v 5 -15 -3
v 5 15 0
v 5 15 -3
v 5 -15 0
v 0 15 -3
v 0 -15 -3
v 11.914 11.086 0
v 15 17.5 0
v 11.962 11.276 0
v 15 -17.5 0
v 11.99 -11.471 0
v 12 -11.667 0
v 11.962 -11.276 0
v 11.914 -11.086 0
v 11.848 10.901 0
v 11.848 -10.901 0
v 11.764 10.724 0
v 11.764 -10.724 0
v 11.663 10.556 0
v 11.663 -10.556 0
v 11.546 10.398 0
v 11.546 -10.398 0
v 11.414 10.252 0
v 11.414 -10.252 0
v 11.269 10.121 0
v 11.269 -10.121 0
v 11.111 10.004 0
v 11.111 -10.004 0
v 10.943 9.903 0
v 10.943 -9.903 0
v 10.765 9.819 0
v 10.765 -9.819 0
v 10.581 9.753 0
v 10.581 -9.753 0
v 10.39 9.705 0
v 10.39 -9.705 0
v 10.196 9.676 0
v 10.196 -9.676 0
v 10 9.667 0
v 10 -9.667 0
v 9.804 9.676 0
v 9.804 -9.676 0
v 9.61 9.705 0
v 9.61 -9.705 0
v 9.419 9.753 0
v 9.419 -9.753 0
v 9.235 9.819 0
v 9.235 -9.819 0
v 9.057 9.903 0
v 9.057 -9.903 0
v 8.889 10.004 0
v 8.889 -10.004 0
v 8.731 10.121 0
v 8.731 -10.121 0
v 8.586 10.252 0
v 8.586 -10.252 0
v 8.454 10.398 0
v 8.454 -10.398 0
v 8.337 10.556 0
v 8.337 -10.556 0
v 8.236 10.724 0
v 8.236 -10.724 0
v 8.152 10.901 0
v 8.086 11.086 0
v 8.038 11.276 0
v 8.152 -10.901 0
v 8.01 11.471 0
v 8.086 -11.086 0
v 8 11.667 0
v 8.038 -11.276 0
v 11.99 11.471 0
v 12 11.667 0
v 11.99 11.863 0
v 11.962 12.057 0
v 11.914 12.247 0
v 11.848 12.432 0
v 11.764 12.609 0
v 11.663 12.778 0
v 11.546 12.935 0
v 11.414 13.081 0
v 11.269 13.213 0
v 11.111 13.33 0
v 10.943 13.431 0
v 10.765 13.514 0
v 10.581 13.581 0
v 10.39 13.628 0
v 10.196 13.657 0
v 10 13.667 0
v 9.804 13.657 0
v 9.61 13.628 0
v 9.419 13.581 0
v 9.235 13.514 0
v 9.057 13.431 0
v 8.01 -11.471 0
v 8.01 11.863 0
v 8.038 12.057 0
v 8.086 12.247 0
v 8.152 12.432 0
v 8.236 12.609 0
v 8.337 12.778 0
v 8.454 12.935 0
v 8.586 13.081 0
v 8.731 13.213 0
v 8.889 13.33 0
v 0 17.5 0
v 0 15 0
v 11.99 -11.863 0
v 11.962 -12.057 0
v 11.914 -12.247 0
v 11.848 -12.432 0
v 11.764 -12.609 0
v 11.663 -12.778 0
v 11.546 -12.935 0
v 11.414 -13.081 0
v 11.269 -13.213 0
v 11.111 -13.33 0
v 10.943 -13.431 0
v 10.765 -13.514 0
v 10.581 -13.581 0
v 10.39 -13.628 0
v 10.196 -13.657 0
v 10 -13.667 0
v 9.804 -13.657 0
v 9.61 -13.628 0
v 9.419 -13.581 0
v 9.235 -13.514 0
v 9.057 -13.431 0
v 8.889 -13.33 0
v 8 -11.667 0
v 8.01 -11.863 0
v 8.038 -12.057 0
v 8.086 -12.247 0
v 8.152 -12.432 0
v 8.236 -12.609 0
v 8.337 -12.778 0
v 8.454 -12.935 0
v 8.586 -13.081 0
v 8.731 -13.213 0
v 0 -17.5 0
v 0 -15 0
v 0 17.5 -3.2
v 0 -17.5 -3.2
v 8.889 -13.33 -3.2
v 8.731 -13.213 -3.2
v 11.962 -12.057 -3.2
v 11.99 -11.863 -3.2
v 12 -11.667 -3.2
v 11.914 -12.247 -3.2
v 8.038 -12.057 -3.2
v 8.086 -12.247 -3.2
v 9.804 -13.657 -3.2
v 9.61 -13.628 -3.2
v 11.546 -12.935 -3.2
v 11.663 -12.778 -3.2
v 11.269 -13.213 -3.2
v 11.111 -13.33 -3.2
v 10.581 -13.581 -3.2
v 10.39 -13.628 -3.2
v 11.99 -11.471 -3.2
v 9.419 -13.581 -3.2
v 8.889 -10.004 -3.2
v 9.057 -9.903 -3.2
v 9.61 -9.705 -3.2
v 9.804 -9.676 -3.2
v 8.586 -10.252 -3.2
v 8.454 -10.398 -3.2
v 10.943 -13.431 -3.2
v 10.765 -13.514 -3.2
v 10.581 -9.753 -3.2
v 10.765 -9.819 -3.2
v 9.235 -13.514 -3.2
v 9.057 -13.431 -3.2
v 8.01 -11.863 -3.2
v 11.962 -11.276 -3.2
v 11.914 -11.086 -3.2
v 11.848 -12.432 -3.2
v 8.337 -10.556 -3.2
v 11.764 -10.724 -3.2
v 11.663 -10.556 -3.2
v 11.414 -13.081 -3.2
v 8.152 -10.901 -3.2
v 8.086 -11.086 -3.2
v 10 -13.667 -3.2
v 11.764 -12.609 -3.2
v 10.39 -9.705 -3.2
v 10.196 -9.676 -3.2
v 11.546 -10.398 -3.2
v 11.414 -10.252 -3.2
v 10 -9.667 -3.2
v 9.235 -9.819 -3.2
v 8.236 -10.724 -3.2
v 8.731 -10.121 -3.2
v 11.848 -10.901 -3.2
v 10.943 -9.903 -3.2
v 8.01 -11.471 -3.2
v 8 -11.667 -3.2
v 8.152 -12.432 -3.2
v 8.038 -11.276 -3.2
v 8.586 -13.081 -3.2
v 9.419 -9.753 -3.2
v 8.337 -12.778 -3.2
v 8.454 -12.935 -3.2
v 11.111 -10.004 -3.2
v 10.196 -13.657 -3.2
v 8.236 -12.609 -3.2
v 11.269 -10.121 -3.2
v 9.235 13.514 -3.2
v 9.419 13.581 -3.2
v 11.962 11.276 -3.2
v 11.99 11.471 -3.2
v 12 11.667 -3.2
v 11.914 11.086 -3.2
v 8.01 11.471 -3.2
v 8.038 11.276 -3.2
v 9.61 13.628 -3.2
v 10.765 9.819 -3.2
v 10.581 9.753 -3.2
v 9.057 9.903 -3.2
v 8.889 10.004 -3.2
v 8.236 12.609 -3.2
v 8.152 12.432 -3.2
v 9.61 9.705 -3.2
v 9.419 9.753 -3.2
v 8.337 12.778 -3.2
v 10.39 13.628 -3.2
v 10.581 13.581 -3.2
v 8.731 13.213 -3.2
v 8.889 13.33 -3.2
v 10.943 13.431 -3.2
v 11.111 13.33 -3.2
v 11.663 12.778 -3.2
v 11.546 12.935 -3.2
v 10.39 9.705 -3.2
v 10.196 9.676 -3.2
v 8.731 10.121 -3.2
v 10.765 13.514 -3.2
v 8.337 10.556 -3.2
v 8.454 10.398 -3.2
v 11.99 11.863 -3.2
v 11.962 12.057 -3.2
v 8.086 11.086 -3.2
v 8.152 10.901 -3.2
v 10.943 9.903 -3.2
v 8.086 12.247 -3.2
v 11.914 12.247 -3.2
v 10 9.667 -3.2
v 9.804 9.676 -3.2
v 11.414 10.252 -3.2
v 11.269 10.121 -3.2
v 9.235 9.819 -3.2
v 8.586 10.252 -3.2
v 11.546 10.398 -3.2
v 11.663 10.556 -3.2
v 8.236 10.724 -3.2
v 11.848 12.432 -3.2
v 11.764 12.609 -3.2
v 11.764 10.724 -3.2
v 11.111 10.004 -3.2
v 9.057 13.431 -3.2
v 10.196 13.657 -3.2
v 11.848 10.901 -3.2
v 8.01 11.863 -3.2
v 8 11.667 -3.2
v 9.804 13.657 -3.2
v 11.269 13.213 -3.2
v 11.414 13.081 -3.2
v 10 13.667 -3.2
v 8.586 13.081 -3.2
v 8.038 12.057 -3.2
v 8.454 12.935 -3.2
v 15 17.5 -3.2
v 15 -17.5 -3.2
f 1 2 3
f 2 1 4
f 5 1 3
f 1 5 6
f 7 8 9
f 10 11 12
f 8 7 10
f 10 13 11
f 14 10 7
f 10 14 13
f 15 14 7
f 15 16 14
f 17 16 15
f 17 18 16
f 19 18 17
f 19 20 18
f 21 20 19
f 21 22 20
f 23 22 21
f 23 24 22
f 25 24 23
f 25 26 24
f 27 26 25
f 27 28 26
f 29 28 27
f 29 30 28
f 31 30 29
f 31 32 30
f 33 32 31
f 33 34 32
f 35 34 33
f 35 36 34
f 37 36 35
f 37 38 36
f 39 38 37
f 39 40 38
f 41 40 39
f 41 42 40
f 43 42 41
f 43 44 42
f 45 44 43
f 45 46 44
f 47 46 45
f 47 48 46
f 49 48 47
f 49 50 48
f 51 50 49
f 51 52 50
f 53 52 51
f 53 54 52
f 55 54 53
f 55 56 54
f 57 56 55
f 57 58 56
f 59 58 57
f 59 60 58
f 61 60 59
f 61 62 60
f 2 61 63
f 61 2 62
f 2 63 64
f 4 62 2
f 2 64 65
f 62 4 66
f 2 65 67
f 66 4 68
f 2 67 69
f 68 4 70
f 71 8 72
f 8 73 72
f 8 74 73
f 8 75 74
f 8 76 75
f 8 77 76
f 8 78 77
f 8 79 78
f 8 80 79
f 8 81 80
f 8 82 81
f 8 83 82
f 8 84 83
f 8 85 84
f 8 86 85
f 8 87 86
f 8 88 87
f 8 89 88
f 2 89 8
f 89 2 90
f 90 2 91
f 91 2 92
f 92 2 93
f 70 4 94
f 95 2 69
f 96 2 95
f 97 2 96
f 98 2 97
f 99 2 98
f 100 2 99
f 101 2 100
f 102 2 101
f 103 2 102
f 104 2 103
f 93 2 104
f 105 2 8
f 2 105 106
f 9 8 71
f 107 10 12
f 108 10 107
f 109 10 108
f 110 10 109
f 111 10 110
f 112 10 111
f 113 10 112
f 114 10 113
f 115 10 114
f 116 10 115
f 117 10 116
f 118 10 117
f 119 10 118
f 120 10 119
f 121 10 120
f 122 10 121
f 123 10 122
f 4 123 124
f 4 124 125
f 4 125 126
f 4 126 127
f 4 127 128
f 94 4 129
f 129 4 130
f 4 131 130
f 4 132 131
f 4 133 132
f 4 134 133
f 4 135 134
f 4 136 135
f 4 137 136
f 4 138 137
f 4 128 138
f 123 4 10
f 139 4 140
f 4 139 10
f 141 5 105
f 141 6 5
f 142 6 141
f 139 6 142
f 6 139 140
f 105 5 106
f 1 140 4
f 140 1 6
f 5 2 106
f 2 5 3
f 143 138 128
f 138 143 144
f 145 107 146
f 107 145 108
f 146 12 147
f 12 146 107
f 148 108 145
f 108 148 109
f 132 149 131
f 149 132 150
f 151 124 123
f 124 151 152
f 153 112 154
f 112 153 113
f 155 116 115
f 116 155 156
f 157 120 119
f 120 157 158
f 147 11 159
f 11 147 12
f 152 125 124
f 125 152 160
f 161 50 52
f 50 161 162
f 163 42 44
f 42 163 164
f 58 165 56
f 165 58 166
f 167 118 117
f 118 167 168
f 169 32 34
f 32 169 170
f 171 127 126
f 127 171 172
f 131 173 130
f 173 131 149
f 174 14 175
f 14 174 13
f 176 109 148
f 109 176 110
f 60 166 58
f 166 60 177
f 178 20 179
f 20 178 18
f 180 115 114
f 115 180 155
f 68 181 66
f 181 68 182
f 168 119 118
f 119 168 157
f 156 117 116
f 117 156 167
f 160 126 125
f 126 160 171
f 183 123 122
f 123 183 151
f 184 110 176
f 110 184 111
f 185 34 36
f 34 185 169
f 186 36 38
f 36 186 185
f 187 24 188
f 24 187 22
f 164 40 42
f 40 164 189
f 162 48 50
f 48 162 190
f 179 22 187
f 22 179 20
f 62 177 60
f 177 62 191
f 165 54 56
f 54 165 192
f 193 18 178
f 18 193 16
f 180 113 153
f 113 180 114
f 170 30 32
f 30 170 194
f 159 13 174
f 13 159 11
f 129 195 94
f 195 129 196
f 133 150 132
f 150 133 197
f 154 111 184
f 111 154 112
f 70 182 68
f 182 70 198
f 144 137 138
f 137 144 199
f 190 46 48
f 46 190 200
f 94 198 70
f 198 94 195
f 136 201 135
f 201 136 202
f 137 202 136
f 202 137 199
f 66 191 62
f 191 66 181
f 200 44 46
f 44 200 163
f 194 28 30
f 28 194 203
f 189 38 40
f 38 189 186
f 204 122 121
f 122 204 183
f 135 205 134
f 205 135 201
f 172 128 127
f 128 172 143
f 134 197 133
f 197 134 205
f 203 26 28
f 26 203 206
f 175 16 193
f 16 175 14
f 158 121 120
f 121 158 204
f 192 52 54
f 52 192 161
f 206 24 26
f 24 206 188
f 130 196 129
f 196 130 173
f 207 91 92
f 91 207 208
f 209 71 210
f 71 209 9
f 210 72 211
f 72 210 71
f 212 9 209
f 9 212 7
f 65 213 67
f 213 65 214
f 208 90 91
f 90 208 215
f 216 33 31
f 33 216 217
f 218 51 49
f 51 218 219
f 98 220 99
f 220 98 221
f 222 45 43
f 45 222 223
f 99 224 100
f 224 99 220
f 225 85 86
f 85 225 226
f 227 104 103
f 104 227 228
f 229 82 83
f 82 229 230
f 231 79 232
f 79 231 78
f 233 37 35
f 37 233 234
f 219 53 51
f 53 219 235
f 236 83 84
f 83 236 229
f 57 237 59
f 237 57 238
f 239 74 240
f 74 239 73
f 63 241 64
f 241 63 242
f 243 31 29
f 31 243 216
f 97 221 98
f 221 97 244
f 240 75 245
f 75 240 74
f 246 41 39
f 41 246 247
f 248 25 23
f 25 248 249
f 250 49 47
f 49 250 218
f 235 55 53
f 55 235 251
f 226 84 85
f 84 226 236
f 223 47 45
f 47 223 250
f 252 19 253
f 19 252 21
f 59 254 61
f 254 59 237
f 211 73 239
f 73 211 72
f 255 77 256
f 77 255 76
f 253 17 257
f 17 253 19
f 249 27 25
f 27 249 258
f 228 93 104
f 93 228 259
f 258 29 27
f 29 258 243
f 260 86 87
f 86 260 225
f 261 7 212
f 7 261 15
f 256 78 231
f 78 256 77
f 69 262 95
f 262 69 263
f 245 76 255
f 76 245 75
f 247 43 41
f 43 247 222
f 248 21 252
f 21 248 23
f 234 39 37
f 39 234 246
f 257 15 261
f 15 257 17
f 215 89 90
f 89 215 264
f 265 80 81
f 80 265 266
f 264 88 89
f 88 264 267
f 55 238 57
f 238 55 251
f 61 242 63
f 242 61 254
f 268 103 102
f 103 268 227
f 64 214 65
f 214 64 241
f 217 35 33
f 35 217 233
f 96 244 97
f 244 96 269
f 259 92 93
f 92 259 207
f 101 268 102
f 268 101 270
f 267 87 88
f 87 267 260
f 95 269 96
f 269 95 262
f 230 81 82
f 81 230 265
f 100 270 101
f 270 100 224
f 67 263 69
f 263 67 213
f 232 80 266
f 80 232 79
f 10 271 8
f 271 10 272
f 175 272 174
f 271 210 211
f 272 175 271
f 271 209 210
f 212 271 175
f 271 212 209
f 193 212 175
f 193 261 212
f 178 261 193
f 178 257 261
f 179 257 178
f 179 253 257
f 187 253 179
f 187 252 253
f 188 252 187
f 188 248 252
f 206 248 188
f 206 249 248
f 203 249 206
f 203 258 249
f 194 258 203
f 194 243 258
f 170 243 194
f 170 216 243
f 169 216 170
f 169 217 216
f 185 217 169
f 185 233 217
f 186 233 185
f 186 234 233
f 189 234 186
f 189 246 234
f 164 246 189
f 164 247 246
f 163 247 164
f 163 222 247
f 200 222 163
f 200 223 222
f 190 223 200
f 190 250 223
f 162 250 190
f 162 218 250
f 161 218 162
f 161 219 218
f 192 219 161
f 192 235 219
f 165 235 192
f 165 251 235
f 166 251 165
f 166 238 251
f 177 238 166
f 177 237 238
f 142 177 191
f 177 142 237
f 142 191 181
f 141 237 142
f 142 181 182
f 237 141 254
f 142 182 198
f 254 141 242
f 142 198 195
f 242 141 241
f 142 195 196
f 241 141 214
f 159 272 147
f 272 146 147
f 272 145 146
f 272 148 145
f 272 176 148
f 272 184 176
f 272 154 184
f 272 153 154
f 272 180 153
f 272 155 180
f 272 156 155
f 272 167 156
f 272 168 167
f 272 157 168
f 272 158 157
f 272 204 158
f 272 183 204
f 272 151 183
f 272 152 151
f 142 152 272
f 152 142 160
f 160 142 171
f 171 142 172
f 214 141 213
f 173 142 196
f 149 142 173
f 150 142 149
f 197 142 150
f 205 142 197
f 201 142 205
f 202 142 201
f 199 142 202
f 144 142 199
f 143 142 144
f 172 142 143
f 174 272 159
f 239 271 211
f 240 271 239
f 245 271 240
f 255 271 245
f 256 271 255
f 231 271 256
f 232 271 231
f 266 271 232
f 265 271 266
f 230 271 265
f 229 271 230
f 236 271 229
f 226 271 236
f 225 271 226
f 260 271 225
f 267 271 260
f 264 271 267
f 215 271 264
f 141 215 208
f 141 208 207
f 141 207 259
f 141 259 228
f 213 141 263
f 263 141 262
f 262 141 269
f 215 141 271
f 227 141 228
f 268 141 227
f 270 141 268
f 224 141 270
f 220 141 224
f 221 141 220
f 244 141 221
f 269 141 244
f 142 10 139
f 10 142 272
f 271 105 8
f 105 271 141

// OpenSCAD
/* BandMate Project, bar_holder.scad
 * bar_holder.scad by Oskari Rundgren is licensed under the
 * Creative Commons Attribution-ShareAlike 4.0 International License.
 */

/* This is for holding down a flat metal bar. Two are needed */

$fn = 64;

bar_width = 30; // Flat bar width. 
bar_height = 3; // Flat bar height. 
bar_inset = 5;  // Flat bar inset. 

screw_hole = 4; // Screw hole diameter. 

x_height = bar_height + 0.2; // Height of block. 
x_length = 15;  // Length of block. 
x_width = bar_width+5;

rotate([180,0,0]) // Flip for printing wihtout support. 
difference()
{
  translate([x_length/2,0,x_height/2]) cube([x_length,bar_width+5,x_height],center=true);
  union()
  {
    translate([bar_inset/2,0,bar_height/2]) cube([bar_inset,bar_width,bar_height],center=true);
    translate([(x_length-bar_inset)/2+bar_inset,x_width/3,0]) cylinder(r=screw_hole/2,h=40);
    translate([(x_length-bar_inset)/2+bar_inset,-x_width/3,0]) cylinder(r=screw_hole/2,h=40);
  }
}
